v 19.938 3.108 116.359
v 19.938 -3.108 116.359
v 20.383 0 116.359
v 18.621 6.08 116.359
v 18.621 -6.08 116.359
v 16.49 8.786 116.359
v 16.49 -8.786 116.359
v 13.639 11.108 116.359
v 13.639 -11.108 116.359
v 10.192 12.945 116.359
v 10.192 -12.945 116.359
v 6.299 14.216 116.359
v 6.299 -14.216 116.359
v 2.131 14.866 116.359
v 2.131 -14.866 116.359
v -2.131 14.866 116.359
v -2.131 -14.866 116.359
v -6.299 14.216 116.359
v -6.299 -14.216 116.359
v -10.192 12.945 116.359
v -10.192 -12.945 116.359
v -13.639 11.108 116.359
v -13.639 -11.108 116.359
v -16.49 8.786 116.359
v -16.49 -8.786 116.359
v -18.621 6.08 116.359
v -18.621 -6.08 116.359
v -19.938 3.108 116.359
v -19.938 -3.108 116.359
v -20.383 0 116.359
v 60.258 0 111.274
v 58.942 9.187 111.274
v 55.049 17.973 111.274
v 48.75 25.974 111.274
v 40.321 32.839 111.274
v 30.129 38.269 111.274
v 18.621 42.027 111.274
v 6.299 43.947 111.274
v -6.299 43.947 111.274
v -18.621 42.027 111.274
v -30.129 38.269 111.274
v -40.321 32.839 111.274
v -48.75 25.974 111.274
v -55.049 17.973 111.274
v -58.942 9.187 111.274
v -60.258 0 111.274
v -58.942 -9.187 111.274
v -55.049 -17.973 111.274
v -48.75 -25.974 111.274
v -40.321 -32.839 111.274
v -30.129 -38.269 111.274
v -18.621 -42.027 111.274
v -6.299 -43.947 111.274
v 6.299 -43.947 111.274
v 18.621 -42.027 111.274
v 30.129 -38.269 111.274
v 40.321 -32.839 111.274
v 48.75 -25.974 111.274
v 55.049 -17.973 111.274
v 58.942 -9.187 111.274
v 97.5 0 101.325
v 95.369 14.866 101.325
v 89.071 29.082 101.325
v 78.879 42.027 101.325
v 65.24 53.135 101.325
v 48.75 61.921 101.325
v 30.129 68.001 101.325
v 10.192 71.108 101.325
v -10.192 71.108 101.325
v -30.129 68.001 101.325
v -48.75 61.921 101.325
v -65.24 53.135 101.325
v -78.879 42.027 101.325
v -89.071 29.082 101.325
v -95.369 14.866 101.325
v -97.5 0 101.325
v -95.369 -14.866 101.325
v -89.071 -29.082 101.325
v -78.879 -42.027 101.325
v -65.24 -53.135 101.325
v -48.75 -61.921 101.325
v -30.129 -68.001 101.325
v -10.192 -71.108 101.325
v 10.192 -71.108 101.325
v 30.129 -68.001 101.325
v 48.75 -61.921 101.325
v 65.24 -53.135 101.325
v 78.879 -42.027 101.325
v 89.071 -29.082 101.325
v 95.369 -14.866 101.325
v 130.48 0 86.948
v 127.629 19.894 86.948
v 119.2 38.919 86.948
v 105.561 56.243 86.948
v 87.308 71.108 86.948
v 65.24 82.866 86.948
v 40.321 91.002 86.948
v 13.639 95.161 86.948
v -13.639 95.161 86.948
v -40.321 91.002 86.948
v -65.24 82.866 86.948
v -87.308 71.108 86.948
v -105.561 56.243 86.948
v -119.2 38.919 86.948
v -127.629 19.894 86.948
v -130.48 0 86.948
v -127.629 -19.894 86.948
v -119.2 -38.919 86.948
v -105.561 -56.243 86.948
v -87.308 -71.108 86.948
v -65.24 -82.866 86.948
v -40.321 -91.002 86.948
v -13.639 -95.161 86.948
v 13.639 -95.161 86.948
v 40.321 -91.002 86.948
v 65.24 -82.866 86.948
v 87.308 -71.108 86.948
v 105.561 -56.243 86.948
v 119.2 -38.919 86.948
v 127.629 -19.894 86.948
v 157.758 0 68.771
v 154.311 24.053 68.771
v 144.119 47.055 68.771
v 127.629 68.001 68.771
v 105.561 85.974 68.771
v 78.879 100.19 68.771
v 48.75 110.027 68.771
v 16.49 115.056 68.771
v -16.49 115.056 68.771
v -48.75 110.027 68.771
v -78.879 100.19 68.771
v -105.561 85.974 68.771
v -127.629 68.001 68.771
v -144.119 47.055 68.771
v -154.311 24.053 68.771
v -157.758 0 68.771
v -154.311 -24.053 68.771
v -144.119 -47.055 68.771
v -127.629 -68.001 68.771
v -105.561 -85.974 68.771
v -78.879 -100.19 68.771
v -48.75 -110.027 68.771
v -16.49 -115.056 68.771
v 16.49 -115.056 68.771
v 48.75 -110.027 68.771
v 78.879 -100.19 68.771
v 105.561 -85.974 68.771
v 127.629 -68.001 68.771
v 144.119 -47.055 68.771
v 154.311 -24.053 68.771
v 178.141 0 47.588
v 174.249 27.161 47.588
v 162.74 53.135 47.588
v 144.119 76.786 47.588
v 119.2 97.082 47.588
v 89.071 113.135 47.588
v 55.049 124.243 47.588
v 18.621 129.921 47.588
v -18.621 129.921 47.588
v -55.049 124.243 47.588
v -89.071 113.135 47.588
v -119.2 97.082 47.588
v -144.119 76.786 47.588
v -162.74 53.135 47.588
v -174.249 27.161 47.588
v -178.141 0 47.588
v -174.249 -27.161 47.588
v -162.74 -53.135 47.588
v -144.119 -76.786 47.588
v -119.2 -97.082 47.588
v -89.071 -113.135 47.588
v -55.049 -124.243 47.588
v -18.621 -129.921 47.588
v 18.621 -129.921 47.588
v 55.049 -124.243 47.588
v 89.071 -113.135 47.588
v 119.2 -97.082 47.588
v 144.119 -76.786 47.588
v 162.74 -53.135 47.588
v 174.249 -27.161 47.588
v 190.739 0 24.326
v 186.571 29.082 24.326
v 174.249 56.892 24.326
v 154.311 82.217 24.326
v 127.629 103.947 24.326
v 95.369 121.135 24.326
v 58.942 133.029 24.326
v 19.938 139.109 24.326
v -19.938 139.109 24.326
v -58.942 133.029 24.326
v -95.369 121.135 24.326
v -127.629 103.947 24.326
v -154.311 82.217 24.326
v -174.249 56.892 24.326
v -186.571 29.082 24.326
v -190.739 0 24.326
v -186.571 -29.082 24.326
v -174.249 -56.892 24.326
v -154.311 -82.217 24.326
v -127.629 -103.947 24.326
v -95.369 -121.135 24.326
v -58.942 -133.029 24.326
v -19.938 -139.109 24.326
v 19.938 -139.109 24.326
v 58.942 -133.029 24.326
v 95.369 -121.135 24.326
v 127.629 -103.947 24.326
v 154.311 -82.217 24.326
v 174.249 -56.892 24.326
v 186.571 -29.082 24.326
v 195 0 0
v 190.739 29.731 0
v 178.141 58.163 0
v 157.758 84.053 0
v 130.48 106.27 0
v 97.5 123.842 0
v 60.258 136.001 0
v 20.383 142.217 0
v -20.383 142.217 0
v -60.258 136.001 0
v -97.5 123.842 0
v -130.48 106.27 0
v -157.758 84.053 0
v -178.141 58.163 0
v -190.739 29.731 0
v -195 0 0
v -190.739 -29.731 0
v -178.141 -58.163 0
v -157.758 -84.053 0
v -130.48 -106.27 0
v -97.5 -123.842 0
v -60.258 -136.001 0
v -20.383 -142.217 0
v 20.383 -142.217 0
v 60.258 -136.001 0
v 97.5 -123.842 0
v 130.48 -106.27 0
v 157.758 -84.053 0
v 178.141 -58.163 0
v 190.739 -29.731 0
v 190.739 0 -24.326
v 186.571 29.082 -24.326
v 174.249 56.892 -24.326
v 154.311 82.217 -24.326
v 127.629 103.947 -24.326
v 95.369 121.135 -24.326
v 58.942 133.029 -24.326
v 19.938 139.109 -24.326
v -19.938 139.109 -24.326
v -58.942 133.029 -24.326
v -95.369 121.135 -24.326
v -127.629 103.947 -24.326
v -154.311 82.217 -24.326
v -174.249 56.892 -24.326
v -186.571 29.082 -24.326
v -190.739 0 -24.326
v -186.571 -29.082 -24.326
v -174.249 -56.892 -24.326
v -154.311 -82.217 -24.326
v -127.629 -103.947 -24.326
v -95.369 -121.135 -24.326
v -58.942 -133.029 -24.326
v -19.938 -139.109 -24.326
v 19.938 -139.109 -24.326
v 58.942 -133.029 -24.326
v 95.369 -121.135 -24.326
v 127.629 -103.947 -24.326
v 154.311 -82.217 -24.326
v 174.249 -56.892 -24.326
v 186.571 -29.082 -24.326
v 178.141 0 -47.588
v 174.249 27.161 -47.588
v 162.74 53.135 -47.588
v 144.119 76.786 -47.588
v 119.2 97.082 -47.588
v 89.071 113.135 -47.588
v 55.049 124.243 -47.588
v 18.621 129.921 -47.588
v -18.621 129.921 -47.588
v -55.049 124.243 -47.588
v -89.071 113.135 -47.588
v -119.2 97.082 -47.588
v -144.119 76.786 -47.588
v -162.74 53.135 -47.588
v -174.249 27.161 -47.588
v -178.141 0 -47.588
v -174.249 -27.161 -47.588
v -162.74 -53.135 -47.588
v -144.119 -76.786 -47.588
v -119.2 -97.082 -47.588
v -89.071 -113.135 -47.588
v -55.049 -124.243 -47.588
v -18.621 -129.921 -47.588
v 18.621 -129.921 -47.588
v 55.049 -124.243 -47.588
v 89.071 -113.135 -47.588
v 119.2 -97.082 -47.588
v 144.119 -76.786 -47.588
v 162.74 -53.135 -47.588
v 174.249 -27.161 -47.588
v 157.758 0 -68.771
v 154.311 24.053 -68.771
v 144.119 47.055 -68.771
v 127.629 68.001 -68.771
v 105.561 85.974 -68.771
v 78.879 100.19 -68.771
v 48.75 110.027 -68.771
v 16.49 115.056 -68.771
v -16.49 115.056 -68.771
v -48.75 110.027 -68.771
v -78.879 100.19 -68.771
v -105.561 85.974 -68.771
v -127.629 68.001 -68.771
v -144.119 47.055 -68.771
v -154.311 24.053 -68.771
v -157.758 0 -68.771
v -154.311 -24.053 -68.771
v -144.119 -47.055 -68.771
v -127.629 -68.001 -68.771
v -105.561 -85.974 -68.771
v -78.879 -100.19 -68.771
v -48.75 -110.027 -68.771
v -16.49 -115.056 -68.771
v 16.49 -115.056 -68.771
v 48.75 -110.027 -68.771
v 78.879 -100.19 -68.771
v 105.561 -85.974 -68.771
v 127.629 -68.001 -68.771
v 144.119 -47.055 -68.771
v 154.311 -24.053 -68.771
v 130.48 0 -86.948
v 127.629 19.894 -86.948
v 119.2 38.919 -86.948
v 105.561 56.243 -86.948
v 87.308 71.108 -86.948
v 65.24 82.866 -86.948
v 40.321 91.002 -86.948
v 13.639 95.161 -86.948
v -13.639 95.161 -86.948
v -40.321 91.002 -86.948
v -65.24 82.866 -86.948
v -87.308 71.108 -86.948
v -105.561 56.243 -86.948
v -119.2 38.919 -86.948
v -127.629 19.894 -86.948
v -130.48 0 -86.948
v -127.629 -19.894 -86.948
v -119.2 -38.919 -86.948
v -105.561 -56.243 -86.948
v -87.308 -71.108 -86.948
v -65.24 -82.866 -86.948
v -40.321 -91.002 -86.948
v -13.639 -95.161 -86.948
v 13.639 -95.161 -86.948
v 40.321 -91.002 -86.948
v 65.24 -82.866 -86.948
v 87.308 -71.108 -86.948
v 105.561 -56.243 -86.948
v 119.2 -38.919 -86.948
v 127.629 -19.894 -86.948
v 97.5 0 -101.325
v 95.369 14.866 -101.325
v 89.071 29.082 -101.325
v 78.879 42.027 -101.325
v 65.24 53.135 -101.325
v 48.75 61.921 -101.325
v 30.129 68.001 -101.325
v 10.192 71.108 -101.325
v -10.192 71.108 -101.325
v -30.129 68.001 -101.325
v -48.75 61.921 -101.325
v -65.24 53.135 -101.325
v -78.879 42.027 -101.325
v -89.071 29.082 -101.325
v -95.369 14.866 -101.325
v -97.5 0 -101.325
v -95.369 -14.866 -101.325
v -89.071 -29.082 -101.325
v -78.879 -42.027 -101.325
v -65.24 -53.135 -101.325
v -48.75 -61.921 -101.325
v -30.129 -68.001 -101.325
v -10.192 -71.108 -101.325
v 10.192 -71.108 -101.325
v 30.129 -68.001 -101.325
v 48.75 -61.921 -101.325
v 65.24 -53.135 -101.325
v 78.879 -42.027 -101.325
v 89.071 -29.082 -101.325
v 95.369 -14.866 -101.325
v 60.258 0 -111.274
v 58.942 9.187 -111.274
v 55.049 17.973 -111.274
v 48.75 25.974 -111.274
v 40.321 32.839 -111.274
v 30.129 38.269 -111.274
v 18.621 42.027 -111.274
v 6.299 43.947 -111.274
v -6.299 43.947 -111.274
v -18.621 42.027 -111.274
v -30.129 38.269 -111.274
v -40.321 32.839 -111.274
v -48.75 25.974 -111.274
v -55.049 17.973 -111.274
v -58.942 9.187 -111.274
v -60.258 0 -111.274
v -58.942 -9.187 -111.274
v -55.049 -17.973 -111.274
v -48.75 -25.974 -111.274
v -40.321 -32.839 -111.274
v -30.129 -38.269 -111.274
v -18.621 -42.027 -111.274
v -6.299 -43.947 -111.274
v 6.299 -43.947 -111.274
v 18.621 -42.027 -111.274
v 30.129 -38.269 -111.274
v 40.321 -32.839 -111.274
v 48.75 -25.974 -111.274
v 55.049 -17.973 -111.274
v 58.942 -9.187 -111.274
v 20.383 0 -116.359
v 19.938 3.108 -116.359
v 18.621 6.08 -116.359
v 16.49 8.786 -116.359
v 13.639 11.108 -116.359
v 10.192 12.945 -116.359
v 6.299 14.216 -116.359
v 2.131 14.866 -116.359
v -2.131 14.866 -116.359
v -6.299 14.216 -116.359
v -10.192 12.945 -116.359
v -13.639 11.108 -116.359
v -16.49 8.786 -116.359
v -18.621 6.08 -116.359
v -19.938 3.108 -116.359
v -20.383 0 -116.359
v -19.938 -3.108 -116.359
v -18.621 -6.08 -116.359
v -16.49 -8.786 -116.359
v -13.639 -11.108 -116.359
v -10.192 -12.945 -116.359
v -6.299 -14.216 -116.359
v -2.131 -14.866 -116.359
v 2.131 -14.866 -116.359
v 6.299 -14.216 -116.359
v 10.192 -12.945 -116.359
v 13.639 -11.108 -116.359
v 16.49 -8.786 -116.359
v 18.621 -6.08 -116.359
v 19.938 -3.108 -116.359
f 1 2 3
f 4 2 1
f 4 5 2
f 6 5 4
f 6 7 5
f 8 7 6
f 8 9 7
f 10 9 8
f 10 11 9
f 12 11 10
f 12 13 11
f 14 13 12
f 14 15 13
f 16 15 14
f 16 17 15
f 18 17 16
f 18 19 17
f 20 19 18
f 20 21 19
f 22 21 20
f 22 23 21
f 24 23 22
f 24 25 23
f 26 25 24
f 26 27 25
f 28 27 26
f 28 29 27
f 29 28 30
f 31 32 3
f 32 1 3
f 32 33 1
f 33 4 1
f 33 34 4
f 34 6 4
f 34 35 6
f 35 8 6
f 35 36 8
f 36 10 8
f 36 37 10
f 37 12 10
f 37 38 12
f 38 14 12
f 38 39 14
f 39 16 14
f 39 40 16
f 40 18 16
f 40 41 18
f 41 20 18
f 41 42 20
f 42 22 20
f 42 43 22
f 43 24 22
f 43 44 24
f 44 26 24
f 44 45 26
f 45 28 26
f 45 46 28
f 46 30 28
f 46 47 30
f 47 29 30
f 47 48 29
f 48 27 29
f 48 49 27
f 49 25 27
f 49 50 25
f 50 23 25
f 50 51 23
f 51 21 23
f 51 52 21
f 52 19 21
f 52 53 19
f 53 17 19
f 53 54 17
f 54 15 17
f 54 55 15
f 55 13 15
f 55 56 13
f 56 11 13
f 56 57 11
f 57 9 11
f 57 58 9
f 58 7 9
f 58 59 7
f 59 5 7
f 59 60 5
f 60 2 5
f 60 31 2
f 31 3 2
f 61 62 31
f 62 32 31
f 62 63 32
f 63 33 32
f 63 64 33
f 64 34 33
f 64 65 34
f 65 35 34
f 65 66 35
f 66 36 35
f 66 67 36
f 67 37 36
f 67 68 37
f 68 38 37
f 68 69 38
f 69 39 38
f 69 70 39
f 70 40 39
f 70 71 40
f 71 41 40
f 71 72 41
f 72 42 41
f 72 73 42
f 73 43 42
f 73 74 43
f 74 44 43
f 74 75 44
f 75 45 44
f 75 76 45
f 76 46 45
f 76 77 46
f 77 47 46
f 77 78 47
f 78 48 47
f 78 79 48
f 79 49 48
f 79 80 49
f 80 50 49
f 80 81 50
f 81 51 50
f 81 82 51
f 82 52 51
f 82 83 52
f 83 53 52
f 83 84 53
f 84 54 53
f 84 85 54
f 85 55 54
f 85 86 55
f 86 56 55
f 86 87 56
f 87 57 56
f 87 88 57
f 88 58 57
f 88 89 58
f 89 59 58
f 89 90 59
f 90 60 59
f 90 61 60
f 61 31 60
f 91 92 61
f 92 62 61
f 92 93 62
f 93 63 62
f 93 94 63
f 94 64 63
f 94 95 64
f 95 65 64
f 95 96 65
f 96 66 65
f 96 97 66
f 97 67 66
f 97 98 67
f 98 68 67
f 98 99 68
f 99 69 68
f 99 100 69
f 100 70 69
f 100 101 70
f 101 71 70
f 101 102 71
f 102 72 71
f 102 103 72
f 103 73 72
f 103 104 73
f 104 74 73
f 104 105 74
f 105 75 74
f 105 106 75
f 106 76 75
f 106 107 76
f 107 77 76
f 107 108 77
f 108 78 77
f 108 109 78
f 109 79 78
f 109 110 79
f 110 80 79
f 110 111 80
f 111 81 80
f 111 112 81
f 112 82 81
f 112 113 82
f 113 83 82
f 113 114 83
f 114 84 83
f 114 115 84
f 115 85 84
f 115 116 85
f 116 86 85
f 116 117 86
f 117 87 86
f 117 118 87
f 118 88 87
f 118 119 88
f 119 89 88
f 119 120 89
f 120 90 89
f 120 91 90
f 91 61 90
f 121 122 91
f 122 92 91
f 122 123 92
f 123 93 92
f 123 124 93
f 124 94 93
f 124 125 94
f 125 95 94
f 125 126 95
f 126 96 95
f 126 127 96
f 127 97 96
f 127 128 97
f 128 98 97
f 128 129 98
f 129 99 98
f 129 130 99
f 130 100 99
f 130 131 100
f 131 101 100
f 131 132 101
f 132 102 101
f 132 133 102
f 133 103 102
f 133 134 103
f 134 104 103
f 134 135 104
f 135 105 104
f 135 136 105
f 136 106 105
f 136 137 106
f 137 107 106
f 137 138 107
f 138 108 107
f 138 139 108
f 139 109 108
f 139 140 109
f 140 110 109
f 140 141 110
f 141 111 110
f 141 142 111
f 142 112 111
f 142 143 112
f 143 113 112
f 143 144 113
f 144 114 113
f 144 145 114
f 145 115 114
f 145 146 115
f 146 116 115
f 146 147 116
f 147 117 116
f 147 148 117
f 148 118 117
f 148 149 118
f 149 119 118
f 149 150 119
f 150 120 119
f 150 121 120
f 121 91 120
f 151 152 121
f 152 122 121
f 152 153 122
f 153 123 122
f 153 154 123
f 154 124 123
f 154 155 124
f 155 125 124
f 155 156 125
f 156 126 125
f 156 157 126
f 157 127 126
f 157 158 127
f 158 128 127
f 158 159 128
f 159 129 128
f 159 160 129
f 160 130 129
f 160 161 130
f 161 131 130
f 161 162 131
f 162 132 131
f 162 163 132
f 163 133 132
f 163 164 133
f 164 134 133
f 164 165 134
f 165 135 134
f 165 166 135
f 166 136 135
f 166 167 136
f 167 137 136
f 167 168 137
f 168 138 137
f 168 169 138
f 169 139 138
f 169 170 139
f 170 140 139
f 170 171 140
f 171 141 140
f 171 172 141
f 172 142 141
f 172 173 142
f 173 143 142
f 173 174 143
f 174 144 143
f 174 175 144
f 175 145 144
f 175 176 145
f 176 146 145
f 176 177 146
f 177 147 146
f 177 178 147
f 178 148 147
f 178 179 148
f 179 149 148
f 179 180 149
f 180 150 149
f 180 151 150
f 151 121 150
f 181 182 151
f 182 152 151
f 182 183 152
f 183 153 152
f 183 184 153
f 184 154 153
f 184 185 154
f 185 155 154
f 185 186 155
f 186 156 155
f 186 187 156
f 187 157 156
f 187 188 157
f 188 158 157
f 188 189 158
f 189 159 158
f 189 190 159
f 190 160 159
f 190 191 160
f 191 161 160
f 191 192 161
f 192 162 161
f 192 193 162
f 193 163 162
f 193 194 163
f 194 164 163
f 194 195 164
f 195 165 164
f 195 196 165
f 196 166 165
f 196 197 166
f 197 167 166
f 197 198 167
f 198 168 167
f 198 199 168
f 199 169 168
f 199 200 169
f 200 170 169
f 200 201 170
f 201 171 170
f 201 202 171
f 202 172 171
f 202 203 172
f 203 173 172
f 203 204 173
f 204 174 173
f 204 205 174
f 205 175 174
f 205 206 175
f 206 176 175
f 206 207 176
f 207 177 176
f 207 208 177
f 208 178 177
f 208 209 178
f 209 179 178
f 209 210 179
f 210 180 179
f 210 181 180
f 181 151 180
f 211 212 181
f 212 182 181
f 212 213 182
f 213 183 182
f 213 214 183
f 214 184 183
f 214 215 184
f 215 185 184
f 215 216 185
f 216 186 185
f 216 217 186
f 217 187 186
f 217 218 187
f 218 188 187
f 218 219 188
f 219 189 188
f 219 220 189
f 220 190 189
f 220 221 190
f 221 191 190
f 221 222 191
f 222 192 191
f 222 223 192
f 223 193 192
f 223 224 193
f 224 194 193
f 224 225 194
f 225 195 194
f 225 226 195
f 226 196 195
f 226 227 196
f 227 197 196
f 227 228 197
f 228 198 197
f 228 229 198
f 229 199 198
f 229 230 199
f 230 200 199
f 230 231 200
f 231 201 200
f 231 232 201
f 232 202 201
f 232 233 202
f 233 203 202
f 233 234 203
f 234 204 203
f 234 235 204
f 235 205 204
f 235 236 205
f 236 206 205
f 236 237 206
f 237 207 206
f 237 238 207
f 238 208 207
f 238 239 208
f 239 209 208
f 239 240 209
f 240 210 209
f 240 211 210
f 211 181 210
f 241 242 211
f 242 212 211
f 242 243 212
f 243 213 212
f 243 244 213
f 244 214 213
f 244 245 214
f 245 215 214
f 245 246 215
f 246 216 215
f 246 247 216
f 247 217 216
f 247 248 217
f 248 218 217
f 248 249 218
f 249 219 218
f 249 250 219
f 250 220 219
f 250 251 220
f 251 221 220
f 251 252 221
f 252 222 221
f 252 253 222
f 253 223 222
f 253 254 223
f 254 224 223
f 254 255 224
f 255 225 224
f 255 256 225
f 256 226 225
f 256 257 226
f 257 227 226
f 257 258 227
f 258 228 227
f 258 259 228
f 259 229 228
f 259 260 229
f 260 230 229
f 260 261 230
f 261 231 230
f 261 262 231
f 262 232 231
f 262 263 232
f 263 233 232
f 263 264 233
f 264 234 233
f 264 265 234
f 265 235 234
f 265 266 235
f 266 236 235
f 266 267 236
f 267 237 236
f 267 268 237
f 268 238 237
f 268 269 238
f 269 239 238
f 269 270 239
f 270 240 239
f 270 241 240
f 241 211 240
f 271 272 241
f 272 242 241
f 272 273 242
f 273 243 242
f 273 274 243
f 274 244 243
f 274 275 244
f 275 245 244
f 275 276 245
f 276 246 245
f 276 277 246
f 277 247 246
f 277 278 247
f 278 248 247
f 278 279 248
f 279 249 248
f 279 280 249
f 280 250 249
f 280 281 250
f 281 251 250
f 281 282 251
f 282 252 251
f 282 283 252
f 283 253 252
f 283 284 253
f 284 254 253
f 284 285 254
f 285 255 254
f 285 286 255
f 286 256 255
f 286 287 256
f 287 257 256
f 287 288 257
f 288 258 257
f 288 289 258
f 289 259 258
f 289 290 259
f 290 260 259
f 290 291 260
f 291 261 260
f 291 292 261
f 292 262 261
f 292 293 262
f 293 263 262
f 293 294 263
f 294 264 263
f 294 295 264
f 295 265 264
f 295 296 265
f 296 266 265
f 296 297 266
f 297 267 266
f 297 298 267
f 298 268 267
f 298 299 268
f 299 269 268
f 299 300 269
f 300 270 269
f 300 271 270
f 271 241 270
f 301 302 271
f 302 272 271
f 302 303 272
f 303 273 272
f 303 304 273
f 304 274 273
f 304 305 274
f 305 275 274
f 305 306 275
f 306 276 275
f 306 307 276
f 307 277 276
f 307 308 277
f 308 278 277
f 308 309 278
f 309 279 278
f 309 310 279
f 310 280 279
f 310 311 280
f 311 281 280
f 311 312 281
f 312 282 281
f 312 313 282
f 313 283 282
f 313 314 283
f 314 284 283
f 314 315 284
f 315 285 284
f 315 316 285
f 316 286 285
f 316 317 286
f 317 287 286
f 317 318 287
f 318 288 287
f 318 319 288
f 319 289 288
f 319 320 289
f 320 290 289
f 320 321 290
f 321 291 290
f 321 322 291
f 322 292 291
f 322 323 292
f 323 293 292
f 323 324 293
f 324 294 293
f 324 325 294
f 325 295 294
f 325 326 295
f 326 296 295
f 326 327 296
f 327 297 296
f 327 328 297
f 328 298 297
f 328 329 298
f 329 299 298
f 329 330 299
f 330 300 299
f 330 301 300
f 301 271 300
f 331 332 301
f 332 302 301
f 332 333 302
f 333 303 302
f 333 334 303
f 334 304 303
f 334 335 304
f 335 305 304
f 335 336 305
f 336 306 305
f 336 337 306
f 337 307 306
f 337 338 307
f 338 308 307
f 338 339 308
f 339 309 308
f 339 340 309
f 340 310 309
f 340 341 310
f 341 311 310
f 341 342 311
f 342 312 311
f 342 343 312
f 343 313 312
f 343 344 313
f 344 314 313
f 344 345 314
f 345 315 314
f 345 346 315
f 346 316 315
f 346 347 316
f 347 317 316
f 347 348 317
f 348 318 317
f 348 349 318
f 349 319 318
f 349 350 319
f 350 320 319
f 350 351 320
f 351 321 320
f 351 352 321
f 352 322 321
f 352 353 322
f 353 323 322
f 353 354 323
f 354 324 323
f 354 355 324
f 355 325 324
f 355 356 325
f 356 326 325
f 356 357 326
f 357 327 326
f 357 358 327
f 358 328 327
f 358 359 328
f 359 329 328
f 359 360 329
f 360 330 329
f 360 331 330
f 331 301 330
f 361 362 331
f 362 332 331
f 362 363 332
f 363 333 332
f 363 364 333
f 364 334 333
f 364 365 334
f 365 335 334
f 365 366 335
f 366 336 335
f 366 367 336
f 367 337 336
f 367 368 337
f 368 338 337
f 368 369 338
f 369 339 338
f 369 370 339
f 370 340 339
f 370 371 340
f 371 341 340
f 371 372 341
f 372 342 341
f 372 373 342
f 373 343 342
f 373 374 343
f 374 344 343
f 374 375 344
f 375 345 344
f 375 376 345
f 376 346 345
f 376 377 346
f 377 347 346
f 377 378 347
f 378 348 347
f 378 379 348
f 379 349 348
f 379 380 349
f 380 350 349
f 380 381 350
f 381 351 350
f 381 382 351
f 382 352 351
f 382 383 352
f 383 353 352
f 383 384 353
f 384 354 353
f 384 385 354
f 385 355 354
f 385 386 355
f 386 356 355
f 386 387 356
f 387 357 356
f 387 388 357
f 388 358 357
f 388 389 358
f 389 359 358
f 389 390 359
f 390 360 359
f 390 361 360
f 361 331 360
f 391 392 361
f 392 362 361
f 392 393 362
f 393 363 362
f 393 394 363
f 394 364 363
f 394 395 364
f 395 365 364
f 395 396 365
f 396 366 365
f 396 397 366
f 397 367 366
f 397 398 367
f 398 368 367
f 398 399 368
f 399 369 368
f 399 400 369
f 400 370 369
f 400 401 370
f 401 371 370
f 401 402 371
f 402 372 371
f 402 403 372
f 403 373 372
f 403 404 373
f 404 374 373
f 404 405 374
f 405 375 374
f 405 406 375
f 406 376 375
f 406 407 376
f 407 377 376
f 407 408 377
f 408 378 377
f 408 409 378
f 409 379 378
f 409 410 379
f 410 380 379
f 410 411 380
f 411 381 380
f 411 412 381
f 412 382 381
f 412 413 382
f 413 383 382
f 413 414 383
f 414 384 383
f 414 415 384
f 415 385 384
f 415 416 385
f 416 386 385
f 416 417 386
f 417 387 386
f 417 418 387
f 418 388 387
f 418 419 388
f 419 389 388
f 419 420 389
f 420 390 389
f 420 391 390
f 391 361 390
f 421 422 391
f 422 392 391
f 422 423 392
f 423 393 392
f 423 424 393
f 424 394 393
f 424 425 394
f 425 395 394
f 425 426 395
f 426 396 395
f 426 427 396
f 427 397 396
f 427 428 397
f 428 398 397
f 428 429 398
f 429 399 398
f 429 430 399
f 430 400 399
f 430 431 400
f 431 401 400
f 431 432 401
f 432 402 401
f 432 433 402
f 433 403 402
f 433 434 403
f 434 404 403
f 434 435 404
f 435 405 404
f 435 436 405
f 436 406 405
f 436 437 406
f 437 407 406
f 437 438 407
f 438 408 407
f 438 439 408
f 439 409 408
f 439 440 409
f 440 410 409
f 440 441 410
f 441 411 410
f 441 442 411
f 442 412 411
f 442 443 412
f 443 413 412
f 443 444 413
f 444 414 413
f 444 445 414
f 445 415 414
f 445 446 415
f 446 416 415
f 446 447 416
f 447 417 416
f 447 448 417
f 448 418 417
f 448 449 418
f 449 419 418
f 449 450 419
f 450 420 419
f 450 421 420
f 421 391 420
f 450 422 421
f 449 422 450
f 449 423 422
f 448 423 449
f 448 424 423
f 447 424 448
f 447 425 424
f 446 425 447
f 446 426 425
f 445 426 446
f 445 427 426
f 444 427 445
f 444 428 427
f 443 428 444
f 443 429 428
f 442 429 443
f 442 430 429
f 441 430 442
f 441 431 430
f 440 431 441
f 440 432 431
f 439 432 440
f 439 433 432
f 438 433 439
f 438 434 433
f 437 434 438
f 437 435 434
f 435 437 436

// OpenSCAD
// Generated by SolidPython 1.0.1 on 2020-07-29 00:46:52


scale(v = [15, 11, 9]) {
	sphere(r = 13);
}
/***********************************************
*********      SolidPython code:      **********
************************************************
 
# import packages: SolidPython
from solid import *
from solid.utils import *
from itertools import chain, combinations, permutations


class Resize:

    def __init__(self, scad_file):
        self.scad_file = scad_file
        #self.scad_file = import_scad(scad_file)
        # cone/cylinder param:
        self.r1 = 0
        self.r2 = 0
        self.h = 0
        # rectangular prism param:
        self.w = 0
        self.l = 0
        # ellipse param:
        self.r = 0

    # import OpenScad code (file name corresponds to shape)


    # classify shape + parameters
    def assign(self, param1, param2, param3):
        if self.scad_file == 'cone.scad':
            self.r1 = param1
            self.r2 = param2
            self.h = param3
        elif self.scad_file == 'cylinder.scad':
            self.r1 = param1
            self.r2 = param2
            self.h = param3
        elif self.scad_file == 'rectangularPrism.scad':
            self.h = param1
            self.l = param2
            self.w = param3
        else:
            self.r = param1
            self.h = param2

    # resize parameters
    def iterate(self):
        x = range(3, 20, 2)
        i = 1
        if self.scad_file == 'cone.scad':
            tempList = list(permutations(x, 2))
            for temp in tempList:
                param1 = temp[0]
                param2 = temp[1]
                filepath = 'produced_scad_files/' + 'cone' + str(param1) + '_' + str(param2) + '_' + '.scad'
                scad_render_to_file(cylinder(h=param1, r1=param2, r2=0), filepath)

        elif self.scad_file == 'cylinder.scad':
            tempList = list(permutations(x, 3))
            for temp in tempList:
                param1 = temp[0]
                param2 = temp[1]
                filepath = 'produced_scad_files/' + 'cylinder' + str(param1) + '_' + str(param2) + '_' + '.scad'
                scad_render_to_file(cylinder(h=param1, r1=param2, r2=param2), filepath)

        elif self.scad_file == 'rectangularPrism.scad':
            tempList = list(permutations(x, 3))
            for temp in tempList:
                param1 = temp[0]
                param2 = temp[1]
                param3 = temp[2]
                filepath = 'produced_scad_files/' + 'rectangularPrism' + str(param1) + '_' + str(param2) + '_' + str(
                    param3) + '.scad'
                scad_render_to_file(cube(size=(param1, param2, param3)), filepath)

        elif self.scad_file == 'ellipse.scad':
            tempList = list(permutations(x, 4))
            for temp in tempList:
                param1 = temp[0]
                param2 = temp[1]
                param3 = temp[2]
                param4 = temp[3]
                filepath = 'produced_scad_files/' + 'ellipse' + str(param1) + '_' + str(param2) + '_' + str(param3) + '_' + str(param4) + '.scad'
                scad_render_to_file(scale([param1, param2, param3])(sphere(r=param4)), filepath)

    def render_to_scadfile(self):
        scad_render_to_file(scad, 'example.scad') 
 
************************************************/
